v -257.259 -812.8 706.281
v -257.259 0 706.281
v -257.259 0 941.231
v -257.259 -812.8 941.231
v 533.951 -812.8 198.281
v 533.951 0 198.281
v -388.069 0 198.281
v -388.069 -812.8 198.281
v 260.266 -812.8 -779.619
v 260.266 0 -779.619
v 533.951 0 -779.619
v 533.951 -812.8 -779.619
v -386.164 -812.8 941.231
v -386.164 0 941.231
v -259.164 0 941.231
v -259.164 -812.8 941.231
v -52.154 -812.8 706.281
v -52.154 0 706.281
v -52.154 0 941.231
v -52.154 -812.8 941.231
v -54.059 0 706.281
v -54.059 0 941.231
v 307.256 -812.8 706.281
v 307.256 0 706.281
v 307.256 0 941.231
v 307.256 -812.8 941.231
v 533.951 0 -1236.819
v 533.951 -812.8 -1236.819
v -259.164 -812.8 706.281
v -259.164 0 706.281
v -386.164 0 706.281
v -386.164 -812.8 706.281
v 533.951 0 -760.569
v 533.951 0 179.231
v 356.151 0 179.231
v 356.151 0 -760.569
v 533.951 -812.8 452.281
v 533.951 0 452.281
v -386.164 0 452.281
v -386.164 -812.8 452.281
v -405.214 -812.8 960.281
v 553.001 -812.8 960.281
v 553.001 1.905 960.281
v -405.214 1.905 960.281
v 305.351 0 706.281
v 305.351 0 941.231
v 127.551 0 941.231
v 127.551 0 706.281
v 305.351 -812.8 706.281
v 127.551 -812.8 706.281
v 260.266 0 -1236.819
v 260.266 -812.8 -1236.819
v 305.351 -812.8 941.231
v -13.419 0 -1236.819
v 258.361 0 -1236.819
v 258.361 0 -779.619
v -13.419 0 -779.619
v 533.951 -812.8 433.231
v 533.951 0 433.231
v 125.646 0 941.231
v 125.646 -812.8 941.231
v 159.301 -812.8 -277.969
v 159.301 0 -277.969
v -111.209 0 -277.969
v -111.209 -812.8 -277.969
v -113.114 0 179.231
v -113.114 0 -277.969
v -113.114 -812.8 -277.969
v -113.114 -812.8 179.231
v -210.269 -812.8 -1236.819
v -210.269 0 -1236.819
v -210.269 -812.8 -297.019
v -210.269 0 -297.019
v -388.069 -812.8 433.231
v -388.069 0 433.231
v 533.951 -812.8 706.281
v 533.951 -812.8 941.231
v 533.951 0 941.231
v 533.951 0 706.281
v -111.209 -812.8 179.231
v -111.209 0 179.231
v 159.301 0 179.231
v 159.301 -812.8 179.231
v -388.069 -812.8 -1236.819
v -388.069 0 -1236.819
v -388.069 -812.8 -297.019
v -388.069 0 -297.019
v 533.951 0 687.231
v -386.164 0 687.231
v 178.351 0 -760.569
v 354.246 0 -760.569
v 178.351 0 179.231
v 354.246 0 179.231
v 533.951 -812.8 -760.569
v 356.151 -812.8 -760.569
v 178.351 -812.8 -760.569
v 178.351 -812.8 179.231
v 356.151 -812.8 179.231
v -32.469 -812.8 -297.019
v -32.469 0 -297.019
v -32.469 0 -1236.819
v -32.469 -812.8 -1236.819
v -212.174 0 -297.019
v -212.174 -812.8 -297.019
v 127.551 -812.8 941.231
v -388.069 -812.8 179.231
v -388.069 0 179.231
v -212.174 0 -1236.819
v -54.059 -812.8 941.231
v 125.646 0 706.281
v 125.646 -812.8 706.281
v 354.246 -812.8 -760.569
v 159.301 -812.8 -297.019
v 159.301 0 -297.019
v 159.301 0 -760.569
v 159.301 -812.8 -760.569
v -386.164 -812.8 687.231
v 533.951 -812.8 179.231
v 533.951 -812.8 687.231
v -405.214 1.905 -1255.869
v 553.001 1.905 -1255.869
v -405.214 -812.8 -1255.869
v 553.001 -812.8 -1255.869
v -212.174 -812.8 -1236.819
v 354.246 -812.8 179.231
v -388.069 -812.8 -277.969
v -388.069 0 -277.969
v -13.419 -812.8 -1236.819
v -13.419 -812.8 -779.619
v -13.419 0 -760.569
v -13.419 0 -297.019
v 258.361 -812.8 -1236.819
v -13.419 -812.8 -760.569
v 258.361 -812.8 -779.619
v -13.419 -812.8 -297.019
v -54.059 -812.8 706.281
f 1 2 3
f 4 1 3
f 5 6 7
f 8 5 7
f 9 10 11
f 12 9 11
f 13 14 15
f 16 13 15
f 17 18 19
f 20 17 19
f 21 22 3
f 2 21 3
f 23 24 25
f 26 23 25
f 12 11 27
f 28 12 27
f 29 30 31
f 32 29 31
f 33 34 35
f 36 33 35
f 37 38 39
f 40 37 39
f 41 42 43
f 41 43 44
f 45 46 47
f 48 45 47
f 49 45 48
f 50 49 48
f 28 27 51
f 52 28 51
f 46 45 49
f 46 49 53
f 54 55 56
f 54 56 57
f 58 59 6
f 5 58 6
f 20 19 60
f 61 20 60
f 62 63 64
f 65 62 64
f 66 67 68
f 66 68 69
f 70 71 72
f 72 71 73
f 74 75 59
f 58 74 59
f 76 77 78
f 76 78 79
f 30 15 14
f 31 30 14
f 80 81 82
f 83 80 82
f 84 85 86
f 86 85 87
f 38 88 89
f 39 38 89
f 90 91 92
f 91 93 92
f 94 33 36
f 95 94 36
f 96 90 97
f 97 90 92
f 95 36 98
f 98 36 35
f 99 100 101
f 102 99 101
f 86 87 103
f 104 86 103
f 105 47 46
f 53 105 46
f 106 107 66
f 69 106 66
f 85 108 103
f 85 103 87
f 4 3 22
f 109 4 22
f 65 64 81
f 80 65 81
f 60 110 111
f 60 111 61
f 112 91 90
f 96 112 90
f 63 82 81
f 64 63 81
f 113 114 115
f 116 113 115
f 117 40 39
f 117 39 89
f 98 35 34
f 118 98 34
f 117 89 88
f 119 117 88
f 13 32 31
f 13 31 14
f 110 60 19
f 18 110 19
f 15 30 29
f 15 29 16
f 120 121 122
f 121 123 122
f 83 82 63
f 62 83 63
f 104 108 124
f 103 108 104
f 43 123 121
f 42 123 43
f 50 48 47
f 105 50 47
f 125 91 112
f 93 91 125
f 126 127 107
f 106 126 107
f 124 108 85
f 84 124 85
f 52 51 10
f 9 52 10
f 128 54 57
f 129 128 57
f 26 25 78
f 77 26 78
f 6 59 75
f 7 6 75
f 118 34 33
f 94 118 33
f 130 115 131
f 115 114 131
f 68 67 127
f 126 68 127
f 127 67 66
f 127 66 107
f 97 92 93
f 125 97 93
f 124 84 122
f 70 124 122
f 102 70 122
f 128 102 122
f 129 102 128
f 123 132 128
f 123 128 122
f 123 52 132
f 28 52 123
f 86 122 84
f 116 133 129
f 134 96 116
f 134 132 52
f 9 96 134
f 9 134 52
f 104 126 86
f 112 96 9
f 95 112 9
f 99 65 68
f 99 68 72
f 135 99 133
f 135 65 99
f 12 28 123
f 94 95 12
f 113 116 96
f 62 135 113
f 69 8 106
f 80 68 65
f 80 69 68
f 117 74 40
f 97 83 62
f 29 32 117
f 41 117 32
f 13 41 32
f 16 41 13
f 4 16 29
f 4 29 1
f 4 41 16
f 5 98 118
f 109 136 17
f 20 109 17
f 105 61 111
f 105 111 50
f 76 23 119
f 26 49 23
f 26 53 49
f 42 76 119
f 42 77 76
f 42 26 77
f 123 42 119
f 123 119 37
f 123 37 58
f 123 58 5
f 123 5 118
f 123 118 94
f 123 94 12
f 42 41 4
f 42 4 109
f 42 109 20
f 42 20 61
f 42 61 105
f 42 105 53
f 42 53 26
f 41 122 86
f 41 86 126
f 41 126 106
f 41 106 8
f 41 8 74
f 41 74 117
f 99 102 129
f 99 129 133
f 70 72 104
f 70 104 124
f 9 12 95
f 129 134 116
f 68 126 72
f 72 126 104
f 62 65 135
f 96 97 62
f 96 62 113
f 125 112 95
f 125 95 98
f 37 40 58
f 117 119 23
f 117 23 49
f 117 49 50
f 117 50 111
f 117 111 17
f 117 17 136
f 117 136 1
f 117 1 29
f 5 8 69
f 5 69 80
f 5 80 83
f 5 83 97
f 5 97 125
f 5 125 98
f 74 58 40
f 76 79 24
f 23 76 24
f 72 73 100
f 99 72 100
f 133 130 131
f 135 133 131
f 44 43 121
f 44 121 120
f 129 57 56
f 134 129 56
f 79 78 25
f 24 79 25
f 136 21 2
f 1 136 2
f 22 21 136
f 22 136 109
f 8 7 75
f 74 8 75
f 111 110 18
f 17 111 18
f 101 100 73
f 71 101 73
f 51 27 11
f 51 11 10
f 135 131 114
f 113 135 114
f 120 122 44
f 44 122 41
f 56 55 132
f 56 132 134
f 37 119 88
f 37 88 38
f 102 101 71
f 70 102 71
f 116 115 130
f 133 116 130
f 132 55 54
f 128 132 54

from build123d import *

# Parameters (mm, degrees)
F0_W     = 172.72
F0_H     = 19.05
F0_W_2   = 1.905
F0_H_2   = 939.8
F0_H_3   = 457.2
F0_H_4   = 234.95
F1_DEPTH = 812.8
F2_W     = 958.215
F2_H     = 2216.15
F3_DEPTH = 1.905


# Not quite as in the source:
# - a feature names something its author has since deleted; it is built from what else it names


with BuildPart() as f1:
    # F0 (on Front) → F1 (new body)
    with BuildSketch(Plane.XZ):
        Polygon((533.950886898, -1236.8191501617), (533.950886898, -1255.8691501617), (553.000886898, -1255.8691501617), (553.000886898, 960.2808498383), (533.950886898, 960.2808498383), (533.950886898, 941.2308498383), (533.950886898, 706.2808498383), (533.950886898, 687.2308498383), (533.950886898, 452.2808498383), (533.950886898, 433.2308498383), (533.950886898, 198.2808498383), (533.950886898, 179.2308498383), (533.950886898, -436.7191501617), (533.950886898, -760.5691501617), (533.950886898, -779.6191501617), align=None)
        Polygon((-212.174113102, -1236.8191501617), (-388.069113102, -1236.8191501617), (-388.069113102, -1255.8691501617), (-342.2091657827, -1255.8691501617), (532.045886898, -1255.8691501617), (533.950886898, -1255.8691501617), (533.950886898, -1236.8191501617), (532.045886898, -1236.8191501617), (260.265886898, -1236.8191501617), (258.360886898, -1236.8191501617), (-13.419113102, -1236.8191501617), (-32.469113102, -1236.8191501617), (-210.269113102, -1236.8191501617), align=None)
        Polygon((-388.069113102, -1255.8691501617), (-388.069113102, -1236.8191501617), (-388.069113102, -436.7191501617), (-388.069113102, -297.0191501617), (-388.069113102, -277.9691501617), (-388.069113102, 179.2308498383), (-388.069113102, 198.2808498383), (-388.069113102, 433.2308498383), (-388.069113102, 452.2808498383), (-386.164113102, 452.2808498383), (-386.164113102, 687.2308498383), (-386.164113102, 706.2808498383), (-386.164113102, 941.2308498383), (-259.164113102, 941.2308498383), (-257.259113102, 941.2308498383), (-54.059113102, 941.2308498383), (-52.154113102, 941.2308498383), (125.645886898, 941.2308498383), (127.550886898, 941.2308498383), (305.350886898, 941.2308498383), (307.255886898, 941.2308498383), (533.950886898, 941.2308498383), (533.950886898, 960.2808498383), (-282.659113102, 960.2808498383), (-405.214113102, 960.2808498383), (-405.214113102, -1255.8691501617), align=None)
        Polygon((-32.469113102, -297.0191501617), (-32.469113102, -1236.8191501617), (-13.419113102, -1236.8191501617), (-13.419113102, -779.6191501617), (-13.419113102, -760.5691501617), (-13.419113102, -297.0191501617), align=None)
        Polygon((-13.419113102, -760.5691501617), (-13.419113102, -779.6191501617), (258.360886898, -779.6191501617), (260.265886898, -779.6191501617), (533.950886898, -779.6191501617), (533.950886898, -760.5691501617), (356.150886898, -760.5691501617), (354.245886898, -760.5691501617), (178.350886898, -760.5691501617), (159.300886898, -760.5691501617), align=None)
        Polygon((159.300886898, -277.9691501617), (159.300886898, -297.0191501617), (159.300886898, -760.5691501617), (178.350886898, -760.5691501617), (178.350886898, 179.2308498383), (159.300886898, 179.2308498383), align=None)
        with Locations((72.940886898, -287.4941501617)):
            Rectangle(F0_W, F0_H)
        Polygon((-388.069113102, -297.0191501617), (-212.174113102, -297.0191501617), (-210.269113102, -297.0191501617), (-32.469113102, -297.0191501617), (-13.419113102, -297.0191501617), (-13.419113102, -277.9691501617), (-111.209113102, -277.9691501617), (-113.114113102, -277.9691501617), (-388.069113102, -277.9691501617), align=None)
        Polygon((-388.069113102, 198.2808498383), (-388.069113102, 179.2308498383), (-113.114113102, 179.2308498383), (-111.209113102, 179.2308498383), (159.300886898, 179.2308498383), (159.300886898, 198.2808498383), align=None)
        Polygon((533.950886898, 198.2808498383), (159.300886898, 198.2808498383), (159.300886898, 179.2308498383), (178.350886898, 179.2308498383), (354.245886898, 179.2308498383), (356.150886898, 179.2308498383), (533.950886898, 179.2308498383), align=None)
        Polygon((-388.069113102, 452.2808498383), (-388.069113102, 433.2308498383), (533.950886898, 433.2308498383), (533.950886898, 452.2808498383), (-386.164113102, 452.2808498383), align=None)
        Polygon((533.950886898, 687.2308498383), (533.950886898, 706.2808498383), (307.255886898, 706.2808498383), (305.350886898, 706.2808498383), (127.550886898, 706.2808498383), (125.645886898, 706.2808498383), (-52.154113102, 706.2808498383), (-54.059113102, 706.2808498383), (-257.259113102, 706.2808498383), (-259.164113102, 706.2808498383), (-386.164113102, 706.2808498383), (-386.164113102, 687.2308498383), align=None)
        with Locations((355.198386898, -290.6691501617)):
            Rectangle(F0_W_2, F0_H_2)
        with Locations((-112.161613102, -49.3691501617)):
            Rectangle(F0_W_2, F0_H_3)
        with Locations((-211.221613102, -766.9191501617)):
            Rectangle(F0_W_2, F0_H_2)
        with Locations((259.313386898, -1008.2191501617)):
            Rectangle(F0_W_2, F0_H_3)
        with Locations((-258.211613102, 823.7558498383)):
            Rectangle(F0_W_2, F0_H_4)
        with Locations((-53.106613102, 823.7558498383)):
            Rectangle(F0_W_2, F0_H_4)
        with Locations((126.598386898, 823.7558498383)):
            Rectangle(F0_W_2, F0_H_4)
        with Locations((306.303386898, 823.7558498383)):
            Rectangle(F0_W_2, F0_H_4)
    extrude(amount=F1_DEPTH)

    # F2 (on face) → F3 (join)
    with BuildSketch(Plane(origin=(0, 0, 0), x_dir=(-1, 0, 0), z_dir=(0, 1, 0))):
        with Locations((-73.893386898, -147.7941501617)):
            Rectangle(F2_W, F2_H)
    extrude(amount=F3_DEPTH)


solid = f1.part
